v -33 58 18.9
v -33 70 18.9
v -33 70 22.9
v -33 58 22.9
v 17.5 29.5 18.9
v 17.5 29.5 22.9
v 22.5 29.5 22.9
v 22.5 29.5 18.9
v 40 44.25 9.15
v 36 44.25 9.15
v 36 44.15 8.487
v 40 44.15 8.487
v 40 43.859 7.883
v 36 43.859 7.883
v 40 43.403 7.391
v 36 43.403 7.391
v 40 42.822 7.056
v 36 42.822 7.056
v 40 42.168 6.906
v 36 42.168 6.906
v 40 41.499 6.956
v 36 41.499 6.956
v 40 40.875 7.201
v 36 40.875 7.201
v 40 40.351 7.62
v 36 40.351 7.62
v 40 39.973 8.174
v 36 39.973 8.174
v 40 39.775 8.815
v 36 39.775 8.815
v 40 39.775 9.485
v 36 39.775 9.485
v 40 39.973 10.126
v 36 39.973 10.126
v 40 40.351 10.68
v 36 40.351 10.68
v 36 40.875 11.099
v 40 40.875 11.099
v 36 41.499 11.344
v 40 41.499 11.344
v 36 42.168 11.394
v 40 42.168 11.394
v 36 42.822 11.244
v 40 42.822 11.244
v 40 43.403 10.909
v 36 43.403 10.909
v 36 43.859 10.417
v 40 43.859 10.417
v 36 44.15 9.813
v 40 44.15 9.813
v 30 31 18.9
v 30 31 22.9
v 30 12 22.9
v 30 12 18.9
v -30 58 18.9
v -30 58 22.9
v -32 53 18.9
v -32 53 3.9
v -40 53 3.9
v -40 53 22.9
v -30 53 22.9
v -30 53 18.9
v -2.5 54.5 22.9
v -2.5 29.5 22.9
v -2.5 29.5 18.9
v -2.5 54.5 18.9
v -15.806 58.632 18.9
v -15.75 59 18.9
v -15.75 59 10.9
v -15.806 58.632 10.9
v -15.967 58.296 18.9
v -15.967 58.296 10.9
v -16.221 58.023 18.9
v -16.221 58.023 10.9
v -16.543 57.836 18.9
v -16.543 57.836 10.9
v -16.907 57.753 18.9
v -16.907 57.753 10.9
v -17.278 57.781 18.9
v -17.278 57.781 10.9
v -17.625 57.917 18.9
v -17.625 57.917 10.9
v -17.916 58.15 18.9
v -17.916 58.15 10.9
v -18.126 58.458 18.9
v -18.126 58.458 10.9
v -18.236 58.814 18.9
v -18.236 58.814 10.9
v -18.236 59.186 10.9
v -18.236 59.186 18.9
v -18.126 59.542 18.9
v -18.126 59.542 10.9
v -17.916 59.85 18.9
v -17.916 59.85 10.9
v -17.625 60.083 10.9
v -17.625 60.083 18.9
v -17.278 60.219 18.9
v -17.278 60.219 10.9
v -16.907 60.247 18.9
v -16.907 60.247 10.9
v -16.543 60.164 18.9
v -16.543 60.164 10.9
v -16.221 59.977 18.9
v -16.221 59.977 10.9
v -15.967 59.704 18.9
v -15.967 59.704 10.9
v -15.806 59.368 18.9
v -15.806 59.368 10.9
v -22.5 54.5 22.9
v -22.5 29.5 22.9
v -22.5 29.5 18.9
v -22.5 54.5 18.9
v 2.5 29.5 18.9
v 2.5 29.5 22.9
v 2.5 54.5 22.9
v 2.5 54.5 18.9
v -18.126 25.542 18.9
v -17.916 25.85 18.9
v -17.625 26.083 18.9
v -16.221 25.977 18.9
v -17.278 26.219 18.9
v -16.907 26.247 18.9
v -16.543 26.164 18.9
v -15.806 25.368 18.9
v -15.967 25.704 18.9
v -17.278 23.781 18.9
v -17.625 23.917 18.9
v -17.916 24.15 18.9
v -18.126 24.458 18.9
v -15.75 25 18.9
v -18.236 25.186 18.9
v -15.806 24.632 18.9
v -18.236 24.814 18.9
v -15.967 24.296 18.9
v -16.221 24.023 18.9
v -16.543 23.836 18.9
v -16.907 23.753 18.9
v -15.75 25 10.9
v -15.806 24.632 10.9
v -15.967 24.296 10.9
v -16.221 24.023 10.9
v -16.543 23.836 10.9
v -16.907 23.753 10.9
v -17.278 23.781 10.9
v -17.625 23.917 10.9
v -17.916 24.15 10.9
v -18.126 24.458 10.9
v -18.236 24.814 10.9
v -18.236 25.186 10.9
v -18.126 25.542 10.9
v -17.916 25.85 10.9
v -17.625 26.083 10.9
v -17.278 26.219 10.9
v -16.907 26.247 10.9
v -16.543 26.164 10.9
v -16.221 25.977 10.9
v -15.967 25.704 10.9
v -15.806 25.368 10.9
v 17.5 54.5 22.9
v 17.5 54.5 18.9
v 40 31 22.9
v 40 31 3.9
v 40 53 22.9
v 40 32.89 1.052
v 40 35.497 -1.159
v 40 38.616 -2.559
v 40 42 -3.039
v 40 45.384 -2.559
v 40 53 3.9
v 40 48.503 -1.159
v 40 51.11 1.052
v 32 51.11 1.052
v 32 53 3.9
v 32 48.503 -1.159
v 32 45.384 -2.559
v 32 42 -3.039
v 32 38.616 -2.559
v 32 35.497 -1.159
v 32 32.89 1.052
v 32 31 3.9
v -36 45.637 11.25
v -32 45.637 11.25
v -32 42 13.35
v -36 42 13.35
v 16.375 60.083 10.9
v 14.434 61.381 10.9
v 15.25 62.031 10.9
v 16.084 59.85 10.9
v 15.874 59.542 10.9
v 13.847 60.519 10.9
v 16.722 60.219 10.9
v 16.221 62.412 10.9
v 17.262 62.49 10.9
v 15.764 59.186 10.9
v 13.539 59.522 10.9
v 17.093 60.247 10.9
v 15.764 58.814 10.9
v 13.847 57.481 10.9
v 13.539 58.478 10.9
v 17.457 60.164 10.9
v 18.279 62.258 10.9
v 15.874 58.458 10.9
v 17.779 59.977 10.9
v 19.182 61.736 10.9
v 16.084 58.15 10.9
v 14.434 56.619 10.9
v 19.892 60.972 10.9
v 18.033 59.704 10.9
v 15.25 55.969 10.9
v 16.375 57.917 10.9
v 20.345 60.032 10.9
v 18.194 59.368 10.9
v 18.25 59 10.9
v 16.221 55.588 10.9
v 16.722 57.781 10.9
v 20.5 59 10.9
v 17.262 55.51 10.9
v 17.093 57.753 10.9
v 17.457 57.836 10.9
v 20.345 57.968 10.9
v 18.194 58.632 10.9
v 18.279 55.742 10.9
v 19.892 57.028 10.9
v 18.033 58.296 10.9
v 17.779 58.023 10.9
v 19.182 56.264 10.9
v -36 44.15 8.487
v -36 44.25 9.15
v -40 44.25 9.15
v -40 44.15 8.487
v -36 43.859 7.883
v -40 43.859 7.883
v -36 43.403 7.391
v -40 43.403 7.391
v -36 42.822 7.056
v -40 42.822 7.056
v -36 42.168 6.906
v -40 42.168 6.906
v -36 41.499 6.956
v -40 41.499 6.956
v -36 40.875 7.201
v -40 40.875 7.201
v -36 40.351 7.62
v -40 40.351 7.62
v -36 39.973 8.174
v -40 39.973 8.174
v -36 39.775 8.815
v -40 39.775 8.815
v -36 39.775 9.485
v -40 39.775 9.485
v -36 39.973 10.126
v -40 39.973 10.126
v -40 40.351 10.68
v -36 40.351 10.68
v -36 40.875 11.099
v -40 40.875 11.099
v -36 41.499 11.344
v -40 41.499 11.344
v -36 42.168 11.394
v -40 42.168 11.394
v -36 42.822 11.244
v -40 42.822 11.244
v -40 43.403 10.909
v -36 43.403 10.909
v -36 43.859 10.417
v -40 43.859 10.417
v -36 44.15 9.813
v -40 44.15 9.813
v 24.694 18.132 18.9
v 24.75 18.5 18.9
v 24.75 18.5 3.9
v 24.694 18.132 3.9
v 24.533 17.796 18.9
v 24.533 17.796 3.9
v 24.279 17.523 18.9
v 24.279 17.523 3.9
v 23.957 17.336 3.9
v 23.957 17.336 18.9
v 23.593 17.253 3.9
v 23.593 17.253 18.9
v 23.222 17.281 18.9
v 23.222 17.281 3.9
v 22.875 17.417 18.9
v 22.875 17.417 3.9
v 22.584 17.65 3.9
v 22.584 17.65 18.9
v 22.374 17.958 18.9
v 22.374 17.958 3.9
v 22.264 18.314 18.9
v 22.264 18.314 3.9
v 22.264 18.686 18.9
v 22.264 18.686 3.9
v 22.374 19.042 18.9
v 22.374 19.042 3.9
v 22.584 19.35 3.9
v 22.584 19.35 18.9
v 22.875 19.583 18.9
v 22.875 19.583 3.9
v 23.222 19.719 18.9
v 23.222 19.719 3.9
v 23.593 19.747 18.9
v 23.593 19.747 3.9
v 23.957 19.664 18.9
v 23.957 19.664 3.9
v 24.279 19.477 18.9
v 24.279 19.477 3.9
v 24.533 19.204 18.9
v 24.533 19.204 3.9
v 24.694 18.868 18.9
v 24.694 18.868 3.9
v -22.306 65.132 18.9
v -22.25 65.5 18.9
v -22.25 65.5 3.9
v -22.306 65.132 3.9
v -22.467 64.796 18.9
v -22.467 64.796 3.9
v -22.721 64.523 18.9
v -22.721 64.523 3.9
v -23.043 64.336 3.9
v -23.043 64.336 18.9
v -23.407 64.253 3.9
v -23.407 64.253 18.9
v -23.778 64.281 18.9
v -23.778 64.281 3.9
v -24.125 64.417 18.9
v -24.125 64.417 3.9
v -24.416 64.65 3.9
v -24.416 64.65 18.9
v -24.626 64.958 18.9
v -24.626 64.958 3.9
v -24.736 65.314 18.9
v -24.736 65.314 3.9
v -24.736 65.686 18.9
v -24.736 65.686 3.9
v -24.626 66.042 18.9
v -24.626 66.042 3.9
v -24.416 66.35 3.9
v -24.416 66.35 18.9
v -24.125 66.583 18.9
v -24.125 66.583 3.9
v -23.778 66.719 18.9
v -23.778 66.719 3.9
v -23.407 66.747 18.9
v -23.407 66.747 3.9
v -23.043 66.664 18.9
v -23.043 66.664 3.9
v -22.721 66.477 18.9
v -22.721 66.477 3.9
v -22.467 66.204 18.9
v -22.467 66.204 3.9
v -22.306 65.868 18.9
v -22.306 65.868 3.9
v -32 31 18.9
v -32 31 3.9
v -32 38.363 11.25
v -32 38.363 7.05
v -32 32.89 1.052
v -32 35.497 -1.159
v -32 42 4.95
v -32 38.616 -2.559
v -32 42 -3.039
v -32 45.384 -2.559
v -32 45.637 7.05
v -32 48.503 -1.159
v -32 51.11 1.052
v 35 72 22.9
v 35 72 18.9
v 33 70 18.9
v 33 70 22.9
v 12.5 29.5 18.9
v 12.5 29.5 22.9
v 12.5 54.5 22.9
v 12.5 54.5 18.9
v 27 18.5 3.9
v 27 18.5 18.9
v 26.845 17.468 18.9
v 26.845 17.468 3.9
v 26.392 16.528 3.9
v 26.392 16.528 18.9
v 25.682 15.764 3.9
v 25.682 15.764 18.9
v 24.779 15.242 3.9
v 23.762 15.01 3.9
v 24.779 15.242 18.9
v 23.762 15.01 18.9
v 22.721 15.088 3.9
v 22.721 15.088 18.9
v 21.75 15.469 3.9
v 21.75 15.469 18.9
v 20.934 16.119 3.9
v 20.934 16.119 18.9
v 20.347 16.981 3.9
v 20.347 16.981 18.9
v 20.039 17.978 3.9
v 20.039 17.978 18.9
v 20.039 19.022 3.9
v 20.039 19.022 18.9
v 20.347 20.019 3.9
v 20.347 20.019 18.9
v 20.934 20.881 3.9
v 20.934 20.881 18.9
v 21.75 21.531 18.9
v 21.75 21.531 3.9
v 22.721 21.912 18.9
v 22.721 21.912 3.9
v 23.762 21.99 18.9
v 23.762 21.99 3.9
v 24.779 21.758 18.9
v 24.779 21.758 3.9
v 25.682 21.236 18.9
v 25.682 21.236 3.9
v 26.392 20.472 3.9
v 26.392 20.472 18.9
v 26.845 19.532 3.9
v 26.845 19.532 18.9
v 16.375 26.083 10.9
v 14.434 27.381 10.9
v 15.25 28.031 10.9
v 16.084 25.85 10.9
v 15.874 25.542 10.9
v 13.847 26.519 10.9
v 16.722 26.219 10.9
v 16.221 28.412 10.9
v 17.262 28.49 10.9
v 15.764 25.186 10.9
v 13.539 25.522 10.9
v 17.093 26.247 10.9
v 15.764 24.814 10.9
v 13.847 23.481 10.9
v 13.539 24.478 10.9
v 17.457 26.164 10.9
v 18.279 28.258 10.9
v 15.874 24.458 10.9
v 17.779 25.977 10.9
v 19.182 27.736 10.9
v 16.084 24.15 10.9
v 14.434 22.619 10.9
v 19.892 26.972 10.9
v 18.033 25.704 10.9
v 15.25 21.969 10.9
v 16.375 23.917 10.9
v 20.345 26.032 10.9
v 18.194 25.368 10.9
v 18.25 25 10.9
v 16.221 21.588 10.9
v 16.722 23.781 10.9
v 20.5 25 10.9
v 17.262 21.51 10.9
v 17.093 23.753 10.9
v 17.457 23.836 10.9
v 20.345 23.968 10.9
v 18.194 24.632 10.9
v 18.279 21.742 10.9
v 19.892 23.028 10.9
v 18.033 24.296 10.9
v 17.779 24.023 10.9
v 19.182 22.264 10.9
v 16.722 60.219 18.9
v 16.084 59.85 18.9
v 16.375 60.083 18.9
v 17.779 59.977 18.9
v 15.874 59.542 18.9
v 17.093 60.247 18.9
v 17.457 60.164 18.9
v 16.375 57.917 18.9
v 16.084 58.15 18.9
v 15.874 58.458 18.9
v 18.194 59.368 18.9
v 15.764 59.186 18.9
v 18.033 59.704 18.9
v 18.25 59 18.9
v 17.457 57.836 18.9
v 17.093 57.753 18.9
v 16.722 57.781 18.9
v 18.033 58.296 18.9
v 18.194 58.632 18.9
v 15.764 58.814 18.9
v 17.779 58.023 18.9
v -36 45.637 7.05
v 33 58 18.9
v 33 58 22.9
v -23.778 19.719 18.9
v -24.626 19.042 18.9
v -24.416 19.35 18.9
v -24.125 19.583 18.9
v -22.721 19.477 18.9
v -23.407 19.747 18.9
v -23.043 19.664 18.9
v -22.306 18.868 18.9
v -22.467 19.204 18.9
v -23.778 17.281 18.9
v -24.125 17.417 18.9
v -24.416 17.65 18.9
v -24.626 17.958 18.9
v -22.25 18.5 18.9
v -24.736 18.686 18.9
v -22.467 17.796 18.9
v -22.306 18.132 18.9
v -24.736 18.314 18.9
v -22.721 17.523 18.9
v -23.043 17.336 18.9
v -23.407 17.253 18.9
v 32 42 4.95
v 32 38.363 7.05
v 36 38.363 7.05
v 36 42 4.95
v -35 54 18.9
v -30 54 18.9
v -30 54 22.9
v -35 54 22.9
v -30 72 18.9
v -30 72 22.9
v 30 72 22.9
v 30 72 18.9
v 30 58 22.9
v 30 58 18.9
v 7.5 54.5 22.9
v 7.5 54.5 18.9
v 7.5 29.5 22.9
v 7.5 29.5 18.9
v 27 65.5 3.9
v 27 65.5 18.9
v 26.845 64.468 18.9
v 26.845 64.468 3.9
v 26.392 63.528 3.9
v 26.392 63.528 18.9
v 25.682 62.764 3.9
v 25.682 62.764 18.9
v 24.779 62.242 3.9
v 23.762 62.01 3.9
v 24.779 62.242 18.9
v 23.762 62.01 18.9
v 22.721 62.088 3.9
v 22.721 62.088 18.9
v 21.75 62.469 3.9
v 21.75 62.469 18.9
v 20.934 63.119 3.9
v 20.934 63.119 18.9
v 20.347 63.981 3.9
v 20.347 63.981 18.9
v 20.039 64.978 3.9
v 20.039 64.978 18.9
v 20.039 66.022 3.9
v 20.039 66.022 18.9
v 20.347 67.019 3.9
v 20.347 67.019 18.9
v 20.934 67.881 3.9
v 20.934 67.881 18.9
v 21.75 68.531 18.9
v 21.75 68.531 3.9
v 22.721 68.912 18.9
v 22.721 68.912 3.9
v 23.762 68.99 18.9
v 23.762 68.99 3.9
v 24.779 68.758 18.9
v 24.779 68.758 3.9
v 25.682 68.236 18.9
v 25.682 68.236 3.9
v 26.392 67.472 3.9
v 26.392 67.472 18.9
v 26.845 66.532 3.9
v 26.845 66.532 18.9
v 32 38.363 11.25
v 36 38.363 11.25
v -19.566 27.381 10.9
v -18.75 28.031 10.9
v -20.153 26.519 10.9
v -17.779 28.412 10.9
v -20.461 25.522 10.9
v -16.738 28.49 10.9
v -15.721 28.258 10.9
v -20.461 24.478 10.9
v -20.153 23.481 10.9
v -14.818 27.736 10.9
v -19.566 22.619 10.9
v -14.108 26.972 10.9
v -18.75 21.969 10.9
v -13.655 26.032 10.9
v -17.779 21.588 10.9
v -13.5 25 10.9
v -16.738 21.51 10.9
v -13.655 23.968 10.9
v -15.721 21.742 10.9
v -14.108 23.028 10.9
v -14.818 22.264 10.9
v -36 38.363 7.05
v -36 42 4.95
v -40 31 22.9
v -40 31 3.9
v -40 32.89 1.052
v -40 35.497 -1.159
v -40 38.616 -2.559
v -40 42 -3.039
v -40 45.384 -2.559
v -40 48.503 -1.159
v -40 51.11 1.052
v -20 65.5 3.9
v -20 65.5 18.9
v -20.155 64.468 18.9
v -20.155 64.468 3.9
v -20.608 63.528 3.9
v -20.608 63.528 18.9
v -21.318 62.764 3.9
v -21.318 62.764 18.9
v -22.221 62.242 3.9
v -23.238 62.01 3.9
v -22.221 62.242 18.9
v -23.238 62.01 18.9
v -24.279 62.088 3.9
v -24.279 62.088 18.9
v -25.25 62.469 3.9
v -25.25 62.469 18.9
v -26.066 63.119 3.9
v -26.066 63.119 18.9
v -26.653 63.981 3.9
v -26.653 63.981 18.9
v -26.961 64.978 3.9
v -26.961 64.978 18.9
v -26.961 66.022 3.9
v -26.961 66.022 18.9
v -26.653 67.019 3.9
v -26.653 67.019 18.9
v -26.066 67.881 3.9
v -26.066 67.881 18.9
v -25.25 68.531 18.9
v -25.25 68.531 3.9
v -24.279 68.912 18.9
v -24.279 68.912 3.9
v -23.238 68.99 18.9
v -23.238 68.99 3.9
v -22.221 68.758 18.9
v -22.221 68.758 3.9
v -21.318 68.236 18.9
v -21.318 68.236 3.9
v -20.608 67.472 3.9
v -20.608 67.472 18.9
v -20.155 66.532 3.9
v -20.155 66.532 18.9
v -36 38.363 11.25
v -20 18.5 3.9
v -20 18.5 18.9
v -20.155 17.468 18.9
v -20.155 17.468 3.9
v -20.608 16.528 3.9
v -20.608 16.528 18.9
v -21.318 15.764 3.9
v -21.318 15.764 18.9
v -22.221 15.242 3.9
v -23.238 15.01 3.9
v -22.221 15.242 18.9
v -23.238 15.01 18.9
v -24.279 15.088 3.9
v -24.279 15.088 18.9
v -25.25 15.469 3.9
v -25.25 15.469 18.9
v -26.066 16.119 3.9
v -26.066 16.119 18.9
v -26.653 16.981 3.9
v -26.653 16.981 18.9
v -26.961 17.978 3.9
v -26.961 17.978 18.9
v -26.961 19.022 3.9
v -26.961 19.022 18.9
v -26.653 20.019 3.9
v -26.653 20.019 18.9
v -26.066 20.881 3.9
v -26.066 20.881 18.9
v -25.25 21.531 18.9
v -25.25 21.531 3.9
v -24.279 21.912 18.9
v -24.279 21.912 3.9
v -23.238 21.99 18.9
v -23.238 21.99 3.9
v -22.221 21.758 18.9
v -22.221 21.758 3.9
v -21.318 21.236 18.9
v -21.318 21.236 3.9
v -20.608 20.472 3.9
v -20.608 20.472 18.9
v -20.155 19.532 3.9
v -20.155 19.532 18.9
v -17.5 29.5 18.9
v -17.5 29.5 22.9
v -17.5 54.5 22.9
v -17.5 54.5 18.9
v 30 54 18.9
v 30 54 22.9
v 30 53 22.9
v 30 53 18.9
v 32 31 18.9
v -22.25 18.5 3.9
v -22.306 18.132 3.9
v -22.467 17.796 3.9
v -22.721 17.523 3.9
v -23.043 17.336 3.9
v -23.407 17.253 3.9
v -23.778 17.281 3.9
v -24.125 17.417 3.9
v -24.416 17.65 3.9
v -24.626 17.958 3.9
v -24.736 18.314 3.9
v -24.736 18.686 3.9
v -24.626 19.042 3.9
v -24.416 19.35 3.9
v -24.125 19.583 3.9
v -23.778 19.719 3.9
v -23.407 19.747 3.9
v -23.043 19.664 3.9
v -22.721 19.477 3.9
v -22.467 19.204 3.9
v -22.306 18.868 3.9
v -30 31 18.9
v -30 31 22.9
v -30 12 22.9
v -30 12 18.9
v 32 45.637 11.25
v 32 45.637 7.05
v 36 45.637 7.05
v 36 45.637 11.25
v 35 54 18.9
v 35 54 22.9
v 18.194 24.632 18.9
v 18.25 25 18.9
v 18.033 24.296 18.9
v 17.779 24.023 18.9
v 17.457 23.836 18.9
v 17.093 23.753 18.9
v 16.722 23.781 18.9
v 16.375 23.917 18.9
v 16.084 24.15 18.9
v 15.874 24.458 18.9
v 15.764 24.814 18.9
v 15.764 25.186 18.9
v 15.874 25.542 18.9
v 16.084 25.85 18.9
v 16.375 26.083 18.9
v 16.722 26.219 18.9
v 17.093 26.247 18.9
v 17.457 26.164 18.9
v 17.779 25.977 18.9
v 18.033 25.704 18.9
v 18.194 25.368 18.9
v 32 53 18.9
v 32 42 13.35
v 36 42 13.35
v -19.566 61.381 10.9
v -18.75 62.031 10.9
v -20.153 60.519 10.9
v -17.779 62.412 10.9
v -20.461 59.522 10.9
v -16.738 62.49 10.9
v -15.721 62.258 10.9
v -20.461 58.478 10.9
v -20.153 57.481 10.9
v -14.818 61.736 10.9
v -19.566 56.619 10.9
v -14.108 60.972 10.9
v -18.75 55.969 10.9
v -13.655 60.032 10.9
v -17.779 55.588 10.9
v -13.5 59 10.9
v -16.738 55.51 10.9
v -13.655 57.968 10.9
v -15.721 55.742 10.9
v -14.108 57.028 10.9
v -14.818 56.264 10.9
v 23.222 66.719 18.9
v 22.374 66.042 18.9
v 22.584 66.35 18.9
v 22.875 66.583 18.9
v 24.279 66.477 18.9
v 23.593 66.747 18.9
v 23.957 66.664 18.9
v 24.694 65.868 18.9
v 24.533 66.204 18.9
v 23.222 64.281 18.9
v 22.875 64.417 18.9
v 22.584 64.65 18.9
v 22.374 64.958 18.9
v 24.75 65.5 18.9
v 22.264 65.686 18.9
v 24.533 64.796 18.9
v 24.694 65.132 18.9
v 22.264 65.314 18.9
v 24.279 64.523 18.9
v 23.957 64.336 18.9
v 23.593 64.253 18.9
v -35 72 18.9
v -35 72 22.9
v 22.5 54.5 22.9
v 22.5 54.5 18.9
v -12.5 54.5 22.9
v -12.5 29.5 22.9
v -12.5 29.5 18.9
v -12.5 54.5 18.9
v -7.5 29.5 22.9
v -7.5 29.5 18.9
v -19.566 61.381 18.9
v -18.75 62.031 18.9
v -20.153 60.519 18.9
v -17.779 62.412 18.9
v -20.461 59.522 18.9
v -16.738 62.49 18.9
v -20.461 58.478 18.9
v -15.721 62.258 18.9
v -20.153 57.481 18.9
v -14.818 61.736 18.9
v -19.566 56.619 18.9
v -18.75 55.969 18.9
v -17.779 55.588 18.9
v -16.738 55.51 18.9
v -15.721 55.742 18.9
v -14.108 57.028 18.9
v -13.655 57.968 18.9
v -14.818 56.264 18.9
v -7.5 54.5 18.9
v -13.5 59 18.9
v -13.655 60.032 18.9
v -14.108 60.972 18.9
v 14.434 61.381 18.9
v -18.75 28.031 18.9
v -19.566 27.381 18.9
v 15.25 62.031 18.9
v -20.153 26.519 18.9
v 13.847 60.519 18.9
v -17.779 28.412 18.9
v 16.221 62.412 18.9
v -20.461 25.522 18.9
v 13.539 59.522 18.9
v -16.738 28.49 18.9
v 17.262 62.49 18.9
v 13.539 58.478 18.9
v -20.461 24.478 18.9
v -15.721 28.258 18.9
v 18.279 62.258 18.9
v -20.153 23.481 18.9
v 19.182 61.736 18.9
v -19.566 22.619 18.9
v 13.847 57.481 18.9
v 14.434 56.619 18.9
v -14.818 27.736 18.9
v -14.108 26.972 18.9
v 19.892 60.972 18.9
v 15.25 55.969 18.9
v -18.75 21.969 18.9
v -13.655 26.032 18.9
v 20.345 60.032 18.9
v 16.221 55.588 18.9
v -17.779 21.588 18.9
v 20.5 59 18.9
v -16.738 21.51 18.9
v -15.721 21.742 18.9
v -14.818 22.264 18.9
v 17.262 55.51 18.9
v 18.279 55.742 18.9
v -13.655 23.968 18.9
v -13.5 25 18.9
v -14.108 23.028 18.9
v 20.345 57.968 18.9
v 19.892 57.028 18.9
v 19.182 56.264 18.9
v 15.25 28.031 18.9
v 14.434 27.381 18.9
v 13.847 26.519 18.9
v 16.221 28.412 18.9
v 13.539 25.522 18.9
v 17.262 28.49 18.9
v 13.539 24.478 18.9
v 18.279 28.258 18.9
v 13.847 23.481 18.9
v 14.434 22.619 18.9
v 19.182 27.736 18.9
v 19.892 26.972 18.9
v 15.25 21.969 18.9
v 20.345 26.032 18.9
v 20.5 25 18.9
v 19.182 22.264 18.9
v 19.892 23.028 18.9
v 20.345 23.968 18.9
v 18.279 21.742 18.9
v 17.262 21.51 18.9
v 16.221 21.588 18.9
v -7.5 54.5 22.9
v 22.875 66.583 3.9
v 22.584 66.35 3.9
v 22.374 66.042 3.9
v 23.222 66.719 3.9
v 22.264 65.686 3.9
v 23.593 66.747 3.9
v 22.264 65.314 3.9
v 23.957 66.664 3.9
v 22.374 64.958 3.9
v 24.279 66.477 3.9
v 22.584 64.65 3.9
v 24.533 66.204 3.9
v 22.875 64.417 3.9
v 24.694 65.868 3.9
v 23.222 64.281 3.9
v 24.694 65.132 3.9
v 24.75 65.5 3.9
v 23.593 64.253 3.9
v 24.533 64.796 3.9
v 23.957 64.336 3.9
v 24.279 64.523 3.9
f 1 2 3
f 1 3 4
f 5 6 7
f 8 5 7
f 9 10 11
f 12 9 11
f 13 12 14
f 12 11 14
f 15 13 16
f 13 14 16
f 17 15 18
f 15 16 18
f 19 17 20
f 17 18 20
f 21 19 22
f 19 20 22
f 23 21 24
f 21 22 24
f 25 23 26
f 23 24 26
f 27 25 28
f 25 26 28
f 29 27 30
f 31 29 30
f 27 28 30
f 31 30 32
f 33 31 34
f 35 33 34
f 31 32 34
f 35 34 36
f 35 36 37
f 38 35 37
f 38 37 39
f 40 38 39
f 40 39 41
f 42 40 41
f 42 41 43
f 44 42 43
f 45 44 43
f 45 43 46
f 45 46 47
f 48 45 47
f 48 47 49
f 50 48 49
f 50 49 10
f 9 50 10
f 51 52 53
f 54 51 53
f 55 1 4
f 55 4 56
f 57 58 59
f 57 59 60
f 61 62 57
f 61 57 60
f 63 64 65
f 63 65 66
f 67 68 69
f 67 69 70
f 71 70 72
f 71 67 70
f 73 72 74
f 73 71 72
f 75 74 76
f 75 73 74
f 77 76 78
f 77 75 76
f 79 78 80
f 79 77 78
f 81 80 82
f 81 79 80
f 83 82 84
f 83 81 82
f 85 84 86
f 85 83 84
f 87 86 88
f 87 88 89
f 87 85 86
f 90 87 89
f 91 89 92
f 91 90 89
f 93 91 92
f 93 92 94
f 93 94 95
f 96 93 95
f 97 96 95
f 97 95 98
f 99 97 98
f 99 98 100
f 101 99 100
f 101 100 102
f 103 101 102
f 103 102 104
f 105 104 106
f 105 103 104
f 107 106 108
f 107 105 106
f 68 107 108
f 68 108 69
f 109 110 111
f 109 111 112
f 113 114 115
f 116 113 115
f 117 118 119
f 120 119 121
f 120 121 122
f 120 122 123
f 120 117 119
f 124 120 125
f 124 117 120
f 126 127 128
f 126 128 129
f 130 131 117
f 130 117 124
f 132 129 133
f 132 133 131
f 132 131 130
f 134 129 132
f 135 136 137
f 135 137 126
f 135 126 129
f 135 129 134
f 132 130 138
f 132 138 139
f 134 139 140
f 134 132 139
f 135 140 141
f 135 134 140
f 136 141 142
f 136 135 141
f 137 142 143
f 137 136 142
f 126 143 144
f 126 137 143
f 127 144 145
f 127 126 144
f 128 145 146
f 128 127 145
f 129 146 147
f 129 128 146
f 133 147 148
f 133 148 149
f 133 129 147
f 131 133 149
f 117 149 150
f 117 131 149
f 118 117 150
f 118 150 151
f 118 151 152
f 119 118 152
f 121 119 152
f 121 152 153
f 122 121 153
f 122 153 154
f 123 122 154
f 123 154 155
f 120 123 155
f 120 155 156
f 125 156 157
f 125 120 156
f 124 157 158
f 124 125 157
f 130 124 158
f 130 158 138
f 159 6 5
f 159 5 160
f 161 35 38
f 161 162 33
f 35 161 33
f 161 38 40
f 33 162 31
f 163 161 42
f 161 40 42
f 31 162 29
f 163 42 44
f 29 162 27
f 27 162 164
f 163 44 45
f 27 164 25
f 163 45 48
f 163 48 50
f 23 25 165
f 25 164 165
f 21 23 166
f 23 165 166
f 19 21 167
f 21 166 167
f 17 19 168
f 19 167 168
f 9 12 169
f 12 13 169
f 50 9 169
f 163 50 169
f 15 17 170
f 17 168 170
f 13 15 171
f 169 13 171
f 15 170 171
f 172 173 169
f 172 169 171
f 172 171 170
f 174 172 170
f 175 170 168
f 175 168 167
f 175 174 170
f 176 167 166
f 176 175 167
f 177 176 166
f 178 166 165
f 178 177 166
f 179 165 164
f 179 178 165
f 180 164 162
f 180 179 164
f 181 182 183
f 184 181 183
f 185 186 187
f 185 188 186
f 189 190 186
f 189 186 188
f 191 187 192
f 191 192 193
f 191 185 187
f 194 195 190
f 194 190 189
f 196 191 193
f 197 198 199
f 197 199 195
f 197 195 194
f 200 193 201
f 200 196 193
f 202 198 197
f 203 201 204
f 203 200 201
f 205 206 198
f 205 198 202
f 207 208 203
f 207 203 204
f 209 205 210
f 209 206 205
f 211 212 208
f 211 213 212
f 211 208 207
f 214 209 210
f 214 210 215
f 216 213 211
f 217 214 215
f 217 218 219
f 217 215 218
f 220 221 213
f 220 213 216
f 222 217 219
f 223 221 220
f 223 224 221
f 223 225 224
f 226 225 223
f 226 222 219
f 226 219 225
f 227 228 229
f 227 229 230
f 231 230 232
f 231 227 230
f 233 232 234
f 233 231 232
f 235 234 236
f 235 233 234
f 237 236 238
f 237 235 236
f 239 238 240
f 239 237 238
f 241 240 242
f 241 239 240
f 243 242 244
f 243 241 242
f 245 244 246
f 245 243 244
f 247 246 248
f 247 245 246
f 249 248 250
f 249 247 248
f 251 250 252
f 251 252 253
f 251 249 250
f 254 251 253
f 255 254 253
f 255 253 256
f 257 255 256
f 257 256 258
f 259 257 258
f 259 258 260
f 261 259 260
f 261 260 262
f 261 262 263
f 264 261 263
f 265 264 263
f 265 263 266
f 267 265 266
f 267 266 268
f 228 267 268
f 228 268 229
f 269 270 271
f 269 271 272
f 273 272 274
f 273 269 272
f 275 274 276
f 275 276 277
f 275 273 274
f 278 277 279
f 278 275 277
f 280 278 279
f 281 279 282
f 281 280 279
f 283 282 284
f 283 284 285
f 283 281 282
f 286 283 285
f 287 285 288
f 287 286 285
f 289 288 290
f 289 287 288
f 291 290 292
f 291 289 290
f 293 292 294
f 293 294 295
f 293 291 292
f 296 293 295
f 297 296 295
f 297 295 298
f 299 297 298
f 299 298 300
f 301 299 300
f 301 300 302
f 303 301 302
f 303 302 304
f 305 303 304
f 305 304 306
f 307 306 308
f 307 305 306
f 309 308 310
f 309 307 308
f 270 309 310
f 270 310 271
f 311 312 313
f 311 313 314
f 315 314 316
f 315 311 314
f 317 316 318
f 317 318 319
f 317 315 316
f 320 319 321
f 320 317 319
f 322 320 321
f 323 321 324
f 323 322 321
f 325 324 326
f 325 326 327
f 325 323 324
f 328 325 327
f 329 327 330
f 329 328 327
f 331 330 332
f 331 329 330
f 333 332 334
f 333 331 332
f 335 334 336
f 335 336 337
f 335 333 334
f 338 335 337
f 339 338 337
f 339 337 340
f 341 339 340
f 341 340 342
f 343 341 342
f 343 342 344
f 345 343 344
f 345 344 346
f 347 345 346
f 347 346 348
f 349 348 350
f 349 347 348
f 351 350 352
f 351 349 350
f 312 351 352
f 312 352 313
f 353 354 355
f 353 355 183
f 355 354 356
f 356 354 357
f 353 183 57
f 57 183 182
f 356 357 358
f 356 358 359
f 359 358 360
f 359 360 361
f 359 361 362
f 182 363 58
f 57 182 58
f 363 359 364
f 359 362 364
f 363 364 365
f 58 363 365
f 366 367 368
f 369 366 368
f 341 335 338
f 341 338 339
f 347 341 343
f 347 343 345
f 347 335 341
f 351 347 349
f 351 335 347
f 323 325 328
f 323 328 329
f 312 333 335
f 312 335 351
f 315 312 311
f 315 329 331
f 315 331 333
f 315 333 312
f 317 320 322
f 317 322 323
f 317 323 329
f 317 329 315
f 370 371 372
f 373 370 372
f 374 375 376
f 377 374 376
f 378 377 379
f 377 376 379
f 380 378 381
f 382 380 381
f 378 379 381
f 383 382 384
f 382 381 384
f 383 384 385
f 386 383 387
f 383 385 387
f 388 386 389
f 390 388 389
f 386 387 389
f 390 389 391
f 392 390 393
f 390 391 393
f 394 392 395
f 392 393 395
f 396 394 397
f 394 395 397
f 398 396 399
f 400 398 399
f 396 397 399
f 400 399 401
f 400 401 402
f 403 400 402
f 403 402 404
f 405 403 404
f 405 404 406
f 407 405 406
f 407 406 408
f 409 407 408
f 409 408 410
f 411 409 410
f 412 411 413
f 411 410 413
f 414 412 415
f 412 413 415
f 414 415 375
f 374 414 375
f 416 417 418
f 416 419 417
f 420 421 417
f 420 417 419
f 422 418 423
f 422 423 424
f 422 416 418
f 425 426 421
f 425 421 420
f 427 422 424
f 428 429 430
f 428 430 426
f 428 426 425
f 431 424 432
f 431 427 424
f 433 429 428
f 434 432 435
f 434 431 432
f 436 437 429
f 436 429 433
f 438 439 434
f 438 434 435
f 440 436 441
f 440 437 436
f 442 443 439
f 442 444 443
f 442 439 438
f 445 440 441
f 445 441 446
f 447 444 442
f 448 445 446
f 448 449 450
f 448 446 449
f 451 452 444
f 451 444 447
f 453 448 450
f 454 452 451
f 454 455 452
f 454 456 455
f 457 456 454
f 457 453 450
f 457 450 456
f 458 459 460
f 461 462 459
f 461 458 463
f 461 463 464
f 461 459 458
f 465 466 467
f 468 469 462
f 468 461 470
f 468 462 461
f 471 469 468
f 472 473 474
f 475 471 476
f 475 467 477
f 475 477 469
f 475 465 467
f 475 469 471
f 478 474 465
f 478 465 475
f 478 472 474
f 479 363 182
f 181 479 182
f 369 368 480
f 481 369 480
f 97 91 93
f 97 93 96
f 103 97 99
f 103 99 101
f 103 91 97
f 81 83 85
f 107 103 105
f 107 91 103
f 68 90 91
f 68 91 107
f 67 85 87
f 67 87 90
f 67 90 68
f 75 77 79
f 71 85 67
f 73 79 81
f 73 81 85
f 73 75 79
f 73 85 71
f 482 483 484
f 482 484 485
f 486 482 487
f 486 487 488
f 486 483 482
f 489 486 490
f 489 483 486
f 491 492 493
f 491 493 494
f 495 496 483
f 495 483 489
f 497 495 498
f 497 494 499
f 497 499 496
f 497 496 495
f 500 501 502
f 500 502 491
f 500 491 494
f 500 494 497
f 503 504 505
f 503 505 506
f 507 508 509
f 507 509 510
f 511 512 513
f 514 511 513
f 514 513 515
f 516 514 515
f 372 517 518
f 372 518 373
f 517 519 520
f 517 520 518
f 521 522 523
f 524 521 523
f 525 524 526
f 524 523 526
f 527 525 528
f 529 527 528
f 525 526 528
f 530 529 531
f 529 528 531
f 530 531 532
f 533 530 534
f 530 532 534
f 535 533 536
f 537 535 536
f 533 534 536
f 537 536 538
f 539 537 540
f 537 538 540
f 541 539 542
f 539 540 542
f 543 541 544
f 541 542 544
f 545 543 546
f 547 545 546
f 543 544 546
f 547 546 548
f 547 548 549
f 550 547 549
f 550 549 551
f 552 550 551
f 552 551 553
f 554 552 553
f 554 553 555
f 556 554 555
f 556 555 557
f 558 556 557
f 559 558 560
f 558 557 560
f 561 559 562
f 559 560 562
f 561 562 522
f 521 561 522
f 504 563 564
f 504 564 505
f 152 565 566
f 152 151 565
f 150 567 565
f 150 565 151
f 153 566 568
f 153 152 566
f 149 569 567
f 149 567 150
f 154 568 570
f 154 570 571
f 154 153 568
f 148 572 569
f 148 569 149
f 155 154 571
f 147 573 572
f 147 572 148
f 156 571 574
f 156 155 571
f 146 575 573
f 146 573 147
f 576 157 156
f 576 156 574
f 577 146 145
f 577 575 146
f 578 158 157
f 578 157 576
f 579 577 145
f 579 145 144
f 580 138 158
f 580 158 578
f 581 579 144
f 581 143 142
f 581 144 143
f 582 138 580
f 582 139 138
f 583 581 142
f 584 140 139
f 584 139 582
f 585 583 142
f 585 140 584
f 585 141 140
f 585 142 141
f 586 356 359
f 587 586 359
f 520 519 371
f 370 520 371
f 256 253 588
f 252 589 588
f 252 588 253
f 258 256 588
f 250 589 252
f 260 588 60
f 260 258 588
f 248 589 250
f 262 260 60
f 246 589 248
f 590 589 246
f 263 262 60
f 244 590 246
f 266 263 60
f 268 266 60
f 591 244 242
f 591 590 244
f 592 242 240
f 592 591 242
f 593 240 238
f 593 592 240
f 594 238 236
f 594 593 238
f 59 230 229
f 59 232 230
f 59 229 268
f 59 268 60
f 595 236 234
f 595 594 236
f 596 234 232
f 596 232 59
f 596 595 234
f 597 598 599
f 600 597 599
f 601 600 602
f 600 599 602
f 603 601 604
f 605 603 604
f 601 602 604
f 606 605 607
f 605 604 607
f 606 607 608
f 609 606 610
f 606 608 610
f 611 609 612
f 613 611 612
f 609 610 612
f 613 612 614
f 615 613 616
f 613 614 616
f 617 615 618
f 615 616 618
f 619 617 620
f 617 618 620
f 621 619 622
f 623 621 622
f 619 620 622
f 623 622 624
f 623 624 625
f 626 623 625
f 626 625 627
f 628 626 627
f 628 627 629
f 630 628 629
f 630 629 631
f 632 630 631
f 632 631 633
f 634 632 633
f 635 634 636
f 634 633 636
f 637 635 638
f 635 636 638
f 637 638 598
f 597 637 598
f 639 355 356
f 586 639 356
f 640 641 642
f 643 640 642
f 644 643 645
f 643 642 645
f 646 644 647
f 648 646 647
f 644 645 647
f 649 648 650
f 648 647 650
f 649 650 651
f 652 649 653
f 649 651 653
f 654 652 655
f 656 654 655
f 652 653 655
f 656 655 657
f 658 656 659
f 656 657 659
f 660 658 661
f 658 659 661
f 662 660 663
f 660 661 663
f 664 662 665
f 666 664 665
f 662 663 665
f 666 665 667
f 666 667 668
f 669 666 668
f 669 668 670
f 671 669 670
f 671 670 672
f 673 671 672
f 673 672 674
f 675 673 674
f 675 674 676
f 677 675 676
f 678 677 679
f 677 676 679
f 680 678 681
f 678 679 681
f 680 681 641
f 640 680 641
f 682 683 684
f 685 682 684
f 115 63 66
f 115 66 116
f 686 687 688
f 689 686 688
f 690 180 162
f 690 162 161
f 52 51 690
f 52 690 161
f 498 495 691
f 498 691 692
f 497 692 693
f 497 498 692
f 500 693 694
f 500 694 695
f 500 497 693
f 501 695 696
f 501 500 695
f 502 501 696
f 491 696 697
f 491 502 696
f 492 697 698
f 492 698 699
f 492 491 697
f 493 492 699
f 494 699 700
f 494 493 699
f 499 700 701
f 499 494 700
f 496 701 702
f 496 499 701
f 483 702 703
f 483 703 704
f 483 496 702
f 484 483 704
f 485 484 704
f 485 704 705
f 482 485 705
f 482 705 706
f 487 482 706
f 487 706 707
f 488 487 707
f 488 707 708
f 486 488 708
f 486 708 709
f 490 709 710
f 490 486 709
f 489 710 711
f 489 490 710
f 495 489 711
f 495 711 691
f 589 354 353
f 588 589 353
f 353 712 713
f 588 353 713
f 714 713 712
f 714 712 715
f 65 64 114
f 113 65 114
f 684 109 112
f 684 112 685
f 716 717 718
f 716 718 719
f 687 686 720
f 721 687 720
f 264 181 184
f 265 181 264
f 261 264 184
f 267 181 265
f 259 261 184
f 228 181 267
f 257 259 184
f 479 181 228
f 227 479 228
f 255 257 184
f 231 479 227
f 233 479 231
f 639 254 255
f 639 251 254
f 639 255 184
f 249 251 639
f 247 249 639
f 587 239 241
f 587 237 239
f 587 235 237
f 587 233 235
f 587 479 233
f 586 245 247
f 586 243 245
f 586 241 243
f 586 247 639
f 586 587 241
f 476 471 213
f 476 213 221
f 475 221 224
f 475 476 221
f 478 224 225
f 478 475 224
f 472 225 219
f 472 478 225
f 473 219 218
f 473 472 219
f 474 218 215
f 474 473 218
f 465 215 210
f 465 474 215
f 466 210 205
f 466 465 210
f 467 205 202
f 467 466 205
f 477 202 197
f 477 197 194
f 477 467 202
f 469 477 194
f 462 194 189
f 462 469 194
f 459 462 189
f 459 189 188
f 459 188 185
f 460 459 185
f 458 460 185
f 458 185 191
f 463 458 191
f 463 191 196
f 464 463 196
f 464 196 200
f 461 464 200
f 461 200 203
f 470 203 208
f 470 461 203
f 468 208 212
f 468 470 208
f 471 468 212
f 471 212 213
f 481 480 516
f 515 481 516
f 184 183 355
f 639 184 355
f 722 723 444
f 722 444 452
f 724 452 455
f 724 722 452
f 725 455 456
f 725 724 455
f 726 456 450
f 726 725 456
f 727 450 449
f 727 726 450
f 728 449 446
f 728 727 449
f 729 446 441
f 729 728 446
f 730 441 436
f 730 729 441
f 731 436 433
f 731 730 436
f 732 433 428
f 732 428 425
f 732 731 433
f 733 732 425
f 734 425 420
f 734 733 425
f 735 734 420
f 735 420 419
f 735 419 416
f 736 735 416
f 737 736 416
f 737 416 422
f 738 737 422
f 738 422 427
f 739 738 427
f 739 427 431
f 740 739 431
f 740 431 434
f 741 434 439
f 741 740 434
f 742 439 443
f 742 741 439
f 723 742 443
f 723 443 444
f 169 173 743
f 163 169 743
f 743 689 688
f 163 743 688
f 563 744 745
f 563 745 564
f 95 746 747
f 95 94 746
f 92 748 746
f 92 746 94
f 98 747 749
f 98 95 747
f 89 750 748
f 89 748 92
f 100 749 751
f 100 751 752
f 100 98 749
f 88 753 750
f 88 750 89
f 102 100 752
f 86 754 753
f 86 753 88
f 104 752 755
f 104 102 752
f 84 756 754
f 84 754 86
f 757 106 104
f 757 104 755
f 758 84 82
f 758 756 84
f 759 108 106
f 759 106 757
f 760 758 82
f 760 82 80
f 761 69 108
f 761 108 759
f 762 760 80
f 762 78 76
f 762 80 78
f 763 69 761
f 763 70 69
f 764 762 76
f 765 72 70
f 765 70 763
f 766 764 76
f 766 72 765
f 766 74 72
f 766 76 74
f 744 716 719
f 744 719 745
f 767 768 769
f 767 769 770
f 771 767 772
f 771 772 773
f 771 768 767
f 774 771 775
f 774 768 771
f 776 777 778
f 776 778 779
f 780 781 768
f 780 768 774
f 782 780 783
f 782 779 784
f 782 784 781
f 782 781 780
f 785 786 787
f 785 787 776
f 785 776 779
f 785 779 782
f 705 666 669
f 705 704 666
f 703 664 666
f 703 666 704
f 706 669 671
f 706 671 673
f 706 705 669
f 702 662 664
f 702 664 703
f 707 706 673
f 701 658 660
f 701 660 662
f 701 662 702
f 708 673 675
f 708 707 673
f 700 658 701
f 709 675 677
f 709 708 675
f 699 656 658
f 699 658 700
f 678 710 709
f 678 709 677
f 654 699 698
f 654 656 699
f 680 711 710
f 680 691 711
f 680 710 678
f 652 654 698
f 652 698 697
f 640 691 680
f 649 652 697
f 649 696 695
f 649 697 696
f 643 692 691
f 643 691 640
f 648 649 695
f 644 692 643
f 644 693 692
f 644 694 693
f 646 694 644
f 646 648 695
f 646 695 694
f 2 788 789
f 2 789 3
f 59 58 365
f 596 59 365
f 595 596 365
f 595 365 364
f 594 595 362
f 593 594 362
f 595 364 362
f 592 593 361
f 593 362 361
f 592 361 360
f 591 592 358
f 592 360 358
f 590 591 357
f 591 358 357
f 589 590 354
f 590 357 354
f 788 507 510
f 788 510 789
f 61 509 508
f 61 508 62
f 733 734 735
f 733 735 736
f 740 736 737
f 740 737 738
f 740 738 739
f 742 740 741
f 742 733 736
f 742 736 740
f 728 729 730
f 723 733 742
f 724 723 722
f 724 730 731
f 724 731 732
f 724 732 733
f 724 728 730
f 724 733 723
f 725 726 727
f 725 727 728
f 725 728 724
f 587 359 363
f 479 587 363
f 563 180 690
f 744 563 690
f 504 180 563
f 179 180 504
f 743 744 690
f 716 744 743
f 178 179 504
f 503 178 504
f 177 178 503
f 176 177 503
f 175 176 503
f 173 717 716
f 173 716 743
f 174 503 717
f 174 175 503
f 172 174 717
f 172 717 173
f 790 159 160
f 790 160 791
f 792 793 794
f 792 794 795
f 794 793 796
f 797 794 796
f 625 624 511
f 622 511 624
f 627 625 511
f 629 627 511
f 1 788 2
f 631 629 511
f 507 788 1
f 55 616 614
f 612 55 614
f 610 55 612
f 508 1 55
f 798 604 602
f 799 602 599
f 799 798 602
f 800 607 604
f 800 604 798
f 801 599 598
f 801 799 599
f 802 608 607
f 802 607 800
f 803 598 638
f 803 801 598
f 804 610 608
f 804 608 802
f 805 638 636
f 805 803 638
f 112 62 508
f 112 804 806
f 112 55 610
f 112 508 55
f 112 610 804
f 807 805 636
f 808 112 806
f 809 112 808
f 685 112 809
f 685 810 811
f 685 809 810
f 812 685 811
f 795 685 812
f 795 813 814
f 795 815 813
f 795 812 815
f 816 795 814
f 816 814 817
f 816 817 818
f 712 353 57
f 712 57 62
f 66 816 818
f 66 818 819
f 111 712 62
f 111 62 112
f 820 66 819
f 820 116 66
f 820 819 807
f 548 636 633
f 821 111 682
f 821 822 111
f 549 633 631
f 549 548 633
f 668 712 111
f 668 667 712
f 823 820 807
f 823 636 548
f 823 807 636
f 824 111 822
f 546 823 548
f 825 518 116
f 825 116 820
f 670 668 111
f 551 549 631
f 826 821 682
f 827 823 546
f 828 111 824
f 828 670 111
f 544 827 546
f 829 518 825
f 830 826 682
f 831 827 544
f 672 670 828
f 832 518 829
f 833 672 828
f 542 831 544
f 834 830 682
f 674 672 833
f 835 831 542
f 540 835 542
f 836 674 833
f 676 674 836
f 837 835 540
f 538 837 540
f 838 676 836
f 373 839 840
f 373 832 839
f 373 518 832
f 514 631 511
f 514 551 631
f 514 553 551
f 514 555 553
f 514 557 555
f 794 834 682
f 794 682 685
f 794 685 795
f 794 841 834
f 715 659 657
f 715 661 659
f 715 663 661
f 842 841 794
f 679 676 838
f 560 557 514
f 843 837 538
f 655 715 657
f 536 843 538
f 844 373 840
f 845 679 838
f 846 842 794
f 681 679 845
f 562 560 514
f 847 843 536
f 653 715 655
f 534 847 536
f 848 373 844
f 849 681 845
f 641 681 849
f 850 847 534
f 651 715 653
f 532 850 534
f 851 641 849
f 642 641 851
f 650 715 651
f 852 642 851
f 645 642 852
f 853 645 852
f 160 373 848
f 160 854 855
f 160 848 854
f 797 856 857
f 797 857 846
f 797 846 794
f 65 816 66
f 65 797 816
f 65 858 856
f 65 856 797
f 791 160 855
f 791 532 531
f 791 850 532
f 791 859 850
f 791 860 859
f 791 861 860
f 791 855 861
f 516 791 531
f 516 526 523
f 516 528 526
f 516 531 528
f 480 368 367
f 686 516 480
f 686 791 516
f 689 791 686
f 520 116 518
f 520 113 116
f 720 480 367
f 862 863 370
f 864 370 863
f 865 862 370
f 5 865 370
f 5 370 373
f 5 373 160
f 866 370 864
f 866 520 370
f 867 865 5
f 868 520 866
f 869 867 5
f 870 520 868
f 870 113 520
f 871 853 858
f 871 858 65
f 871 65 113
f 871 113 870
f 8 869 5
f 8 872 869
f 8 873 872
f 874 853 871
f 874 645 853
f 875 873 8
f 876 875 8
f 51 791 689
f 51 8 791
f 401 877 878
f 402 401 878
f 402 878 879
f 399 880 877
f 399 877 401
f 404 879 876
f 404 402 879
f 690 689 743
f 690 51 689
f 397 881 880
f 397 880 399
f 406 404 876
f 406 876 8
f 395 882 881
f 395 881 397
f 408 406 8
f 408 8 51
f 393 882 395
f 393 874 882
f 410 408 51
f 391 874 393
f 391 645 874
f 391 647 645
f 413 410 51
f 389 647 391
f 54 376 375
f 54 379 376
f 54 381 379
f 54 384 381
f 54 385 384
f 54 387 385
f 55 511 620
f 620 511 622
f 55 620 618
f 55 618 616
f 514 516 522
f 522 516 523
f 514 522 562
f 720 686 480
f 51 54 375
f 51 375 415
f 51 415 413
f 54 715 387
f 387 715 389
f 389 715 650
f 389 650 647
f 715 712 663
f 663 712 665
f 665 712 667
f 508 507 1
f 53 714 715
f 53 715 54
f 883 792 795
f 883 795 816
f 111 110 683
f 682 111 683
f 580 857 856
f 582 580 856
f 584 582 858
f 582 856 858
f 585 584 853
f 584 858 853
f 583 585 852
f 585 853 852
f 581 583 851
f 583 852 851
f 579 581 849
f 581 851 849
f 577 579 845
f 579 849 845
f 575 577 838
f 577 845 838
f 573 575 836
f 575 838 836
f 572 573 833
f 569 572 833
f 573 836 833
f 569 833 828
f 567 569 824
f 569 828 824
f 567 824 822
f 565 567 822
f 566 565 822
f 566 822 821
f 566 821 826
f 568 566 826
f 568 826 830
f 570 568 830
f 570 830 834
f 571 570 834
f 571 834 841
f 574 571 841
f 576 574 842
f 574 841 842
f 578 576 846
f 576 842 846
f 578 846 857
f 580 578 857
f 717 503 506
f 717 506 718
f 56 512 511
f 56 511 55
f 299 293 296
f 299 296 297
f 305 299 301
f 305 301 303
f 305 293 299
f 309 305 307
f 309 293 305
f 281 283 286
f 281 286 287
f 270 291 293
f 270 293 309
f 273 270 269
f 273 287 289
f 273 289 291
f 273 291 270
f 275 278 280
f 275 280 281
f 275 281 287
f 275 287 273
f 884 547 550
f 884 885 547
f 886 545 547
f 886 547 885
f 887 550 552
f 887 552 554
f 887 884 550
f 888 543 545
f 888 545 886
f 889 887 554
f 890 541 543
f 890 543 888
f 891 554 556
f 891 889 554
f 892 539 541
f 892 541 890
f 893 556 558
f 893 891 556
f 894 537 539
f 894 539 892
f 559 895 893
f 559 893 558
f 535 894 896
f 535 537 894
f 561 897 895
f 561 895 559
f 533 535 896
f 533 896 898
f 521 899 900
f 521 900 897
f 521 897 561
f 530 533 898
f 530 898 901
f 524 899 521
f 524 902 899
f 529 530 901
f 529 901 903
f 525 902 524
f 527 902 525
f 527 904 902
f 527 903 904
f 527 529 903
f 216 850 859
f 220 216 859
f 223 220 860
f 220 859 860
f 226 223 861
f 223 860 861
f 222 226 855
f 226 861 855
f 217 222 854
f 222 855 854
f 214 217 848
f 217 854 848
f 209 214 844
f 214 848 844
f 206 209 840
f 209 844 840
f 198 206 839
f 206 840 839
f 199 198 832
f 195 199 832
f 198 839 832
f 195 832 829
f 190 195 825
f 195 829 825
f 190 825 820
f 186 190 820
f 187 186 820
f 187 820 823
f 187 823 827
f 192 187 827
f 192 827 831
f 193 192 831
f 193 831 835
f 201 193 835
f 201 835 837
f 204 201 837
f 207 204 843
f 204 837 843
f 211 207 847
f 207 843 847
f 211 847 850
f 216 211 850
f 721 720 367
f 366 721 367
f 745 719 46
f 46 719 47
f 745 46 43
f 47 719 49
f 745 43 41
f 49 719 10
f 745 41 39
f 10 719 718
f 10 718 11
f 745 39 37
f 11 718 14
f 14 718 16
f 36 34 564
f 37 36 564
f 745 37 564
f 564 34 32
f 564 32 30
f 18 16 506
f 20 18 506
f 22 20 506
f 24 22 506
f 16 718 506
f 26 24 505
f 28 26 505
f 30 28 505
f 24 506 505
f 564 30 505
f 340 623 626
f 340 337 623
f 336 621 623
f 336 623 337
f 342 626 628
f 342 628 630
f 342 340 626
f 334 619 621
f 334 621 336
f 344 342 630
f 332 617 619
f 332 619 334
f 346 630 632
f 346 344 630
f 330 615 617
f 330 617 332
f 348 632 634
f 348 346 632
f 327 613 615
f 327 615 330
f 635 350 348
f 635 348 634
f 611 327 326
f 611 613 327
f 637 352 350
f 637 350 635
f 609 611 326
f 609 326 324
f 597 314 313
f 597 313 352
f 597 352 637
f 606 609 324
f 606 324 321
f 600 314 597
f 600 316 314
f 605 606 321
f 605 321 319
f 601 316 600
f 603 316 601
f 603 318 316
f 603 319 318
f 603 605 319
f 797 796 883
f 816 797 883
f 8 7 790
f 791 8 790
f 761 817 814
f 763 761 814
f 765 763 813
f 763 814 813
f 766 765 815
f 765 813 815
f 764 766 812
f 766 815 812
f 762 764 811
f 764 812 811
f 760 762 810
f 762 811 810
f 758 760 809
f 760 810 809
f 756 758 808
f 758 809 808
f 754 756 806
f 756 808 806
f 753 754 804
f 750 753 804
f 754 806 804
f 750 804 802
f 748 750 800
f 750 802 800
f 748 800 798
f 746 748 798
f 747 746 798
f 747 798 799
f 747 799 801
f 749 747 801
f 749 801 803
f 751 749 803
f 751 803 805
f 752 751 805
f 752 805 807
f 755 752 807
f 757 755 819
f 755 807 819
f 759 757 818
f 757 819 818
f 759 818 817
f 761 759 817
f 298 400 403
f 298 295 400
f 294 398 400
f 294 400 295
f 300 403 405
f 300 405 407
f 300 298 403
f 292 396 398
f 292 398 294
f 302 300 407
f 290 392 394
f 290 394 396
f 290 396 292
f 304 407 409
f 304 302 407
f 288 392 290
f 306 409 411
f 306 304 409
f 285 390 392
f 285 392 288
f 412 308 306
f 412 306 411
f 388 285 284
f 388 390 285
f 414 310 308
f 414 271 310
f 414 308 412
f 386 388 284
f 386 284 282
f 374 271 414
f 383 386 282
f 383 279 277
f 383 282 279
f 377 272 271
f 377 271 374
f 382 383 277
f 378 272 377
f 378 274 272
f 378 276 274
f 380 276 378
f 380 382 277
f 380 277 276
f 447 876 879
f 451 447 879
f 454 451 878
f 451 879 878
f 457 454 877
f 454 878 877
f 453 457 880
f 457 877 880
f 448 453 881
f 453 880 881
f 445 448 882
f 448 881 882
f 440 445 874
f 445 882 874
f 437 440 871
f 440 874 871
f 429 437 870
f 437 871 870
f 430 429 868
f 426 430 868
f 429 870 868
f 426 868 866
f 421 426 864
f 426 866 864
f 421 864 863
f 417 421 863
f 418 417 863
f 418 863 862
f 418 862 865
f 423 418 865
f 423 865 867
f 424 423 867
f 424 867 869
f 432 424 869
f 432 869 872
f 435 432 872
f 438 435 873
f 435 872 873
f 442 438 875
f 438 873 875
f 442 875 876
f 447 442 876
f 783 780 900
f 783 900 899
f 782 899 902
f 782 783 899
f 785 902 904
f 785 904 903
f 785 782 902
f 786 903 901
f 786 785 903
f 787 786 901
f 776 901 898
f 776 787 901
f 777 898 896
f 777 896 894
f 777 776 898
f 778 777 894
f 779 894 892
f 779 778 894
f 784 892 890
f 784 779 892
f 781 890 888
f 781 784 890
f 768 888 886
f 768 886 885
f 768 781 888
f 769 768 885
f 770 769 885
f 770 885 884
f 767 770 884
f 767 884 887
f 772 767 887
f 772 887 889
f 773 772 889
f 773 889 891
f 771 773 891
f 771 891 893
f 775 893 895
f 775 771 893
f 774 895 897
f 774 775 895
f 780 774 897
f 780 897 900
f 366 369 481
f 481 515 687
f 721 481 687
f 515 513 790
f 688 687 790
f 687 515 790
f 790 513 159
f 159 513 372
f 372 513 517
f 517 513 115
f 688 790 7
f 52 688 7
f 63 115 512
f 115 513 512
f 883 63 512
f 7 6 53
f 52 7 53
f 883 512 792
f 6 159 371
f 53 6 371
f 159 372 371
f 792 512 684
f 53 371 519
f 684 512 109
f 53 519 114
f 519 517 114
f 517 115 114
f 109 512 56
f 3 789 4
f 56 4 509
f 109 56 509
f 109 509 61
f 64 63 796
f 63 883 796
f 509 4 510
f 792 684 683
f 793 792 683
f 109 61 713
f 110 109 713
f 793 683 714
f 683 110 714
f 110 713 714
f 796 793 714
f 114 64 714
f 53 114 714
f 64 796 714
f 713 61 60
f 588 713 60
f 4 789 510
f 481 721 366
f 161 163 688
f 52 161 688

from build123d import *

# Parameters (mm, degrees)
SKETCH_W             = 60
SKETCH_H             = 60
PAD_DEPTH            = 4
SKETCH001_R          = 3.5
SKETCH001_R_2        = 1.25
PAD001_DEPTH         = 8
SKETCH009_W          = 5
SKETCH009_H          = 25
POCKET008_DEPTH      = 4
PAD006_DEPTH         = 4
SKETCH015_W          = 22
SKETCH015_H          = 4
PAD007_DEPTH         = 2
SKETCH003_R          = 2.25
PAD008_DEPTH         = 8
SKETCH014_R          = 3.5
SKETCH014_R_2        = 1.25
PAD009_DEPTH         = 15
POCKET_DEPTH         = 4
BODY_PLACEMENT_ANGLE = 180


with BuildPart() as part:
    # Sketch → Pad (new body)
    with BuildSketch(Plane.XY):
        Rectangle(SKETCH_W, SKETCH_H)
    extrude(amount=PAD_DEPTH)

    # Sketch001 (on Face6 of Pad) → Pad001 (join)
    with BuildSketch(Plane.XY.offset(4)):
        with Locations((-17, 17)):
            Circle(SKETCH001_R)
        with Locations((-17, 17)):
            Circle(SKETCH001_R_2, mode=Mode.SUBTRACT)
        with Locations((-17, -17)):
            Circle(SKETCH001_R)
        with Locations((-17, -17)):
            Circle(SKETCH001_R_2, mode=Mode.SUBTRACT)
        with Locations((17, -17)):
            Circle(SKETCH001_R)
        with Locations((17, -17)):
            Circle(SKETCH001_R_2, mode=Mode.SUBTRACT)
        with Locations((17, 17)):
            Circle(SKETCH001_R)
        with Locations((17, 17)):
            Circle(SKETCH001_R_2, mode=Mode.SUBTRACT)
    extrude(amount=PAD001_DEPTH)

    # Sketch009 → Pocket008 (cut)
    with BuildSketch(Plane(origin=(0, 0, 0), x_dir=(1, 0, 0), z_dir=(0, 0, -1))):
        Rectangle(SKETCH009_W, SKETCH009_H)
        with Locations((10, 0)):
            Rectangle(SKETCH009_W, SKETCH009_H)
        with Locations((20, 0)):
            Rectangle(SKETCH009_W, SKETCH009_H)
        with Locations((-10, 0)):
            Rectangle(SKETCH009_W, SKETCH009_H)
        with Locations((-20, 0)):
            Rectangle(SKETCH009_W, SKETCH009_H)
    extrude(amount=-POCKET008_DEPTH, mode=Mode.SUBTRACT)

    # Sketch012 (on Face5 of Pocket008) → Pad006 (join)
    with BuildSketch(Plane.XY.offset(4)):
        Polygon((-30, -12), (-35, -12), (-35, -30), (-33, -28), (-33, -16), (-30, -16), align=None)
    pad006 = extrude(amount=-PAD006_DEPTH)

    # Mirrored005: Pad006 across Sketch012 V_Axis
    add(pad006.mirror(Plane(origin=(0, 0, 4), x_dir=(0, 0, 1), z_dir=(1, 0, 0))))

    # Sketch015 (on Face4 of Pad) → Pad007 (join)
    with BuildSketch(Plane(origin=(-30, 0, 0), x_dir=(0, -1, 0), z_dir=(-1, 0, 0))):
        with Locations((0, 2)):
            Rectangle(SKETCH015_W, SKETCH015_H)
    pad007 = extrude(amount=PAD007_DEPTH)

    # Sketch003 (on Face42 of Pad007) → Pad008 (join)
    with BuildSketch(Plane(origin=(-32, 0, 0), x_dir=(0, -1, 0), z_dir=(-1, 0, 0))):
        with BuildLine():
            ThreePointArc((11, 19), (0, 25.938622), (-11, 19))
            Line((-11, 19), (-11, 0))
            Line((11, 0), (-11, 0))
            Line((11, 19), (11, 0))
        make_face()
        with Locations((0, 13.75)):
            Circle(SKETCH003_R, mode=Mode.SUBTRACT)
    pad008 = extrude(amount=PAD008_DEPTH)

    # Sketch014 → Pad009 (join)
    with BuildSketch(Plane.XY.offset(4)):
        with Locations((-23.5, 23.5)):
            Circle(SKETCH014_R)
        with Locations((-23.5, 23.5)):
            Circle(SKETCH014_R_2, mode=Mode.SUBTRACT)
        with Locations((23.5, 23.5)):
            Circle(SKETCH014_R)
        with Locations((23.5, 23.5)):
            Circle(SKETCH014_R_2, mode=Mode.SUBTRACT)
        with Locations((23.5, -23.5)):
            Circle(SKETCH014_R)
        with Locations((23.5, -23.5)):
            Circle(SKETCH014_R_2, mode=Mode.SUBTRACT)
        with Locations((-23.5, -23.5)):
            Circle(SKETCH014_R)
        with Locations((-23.5, -23.5)):
            Circle(SKETCH014_R_2, mode=Mode.SUBTRACT)
    extrude(amount=PAD009_DEPTH)

    # Sketch016 (on Face58 of Pad009) → Pocket (cut)
    with BuildSketch(Plane.YZ.offset(-32)):
        Polygon((-3.637307, 15.85), (-3.637307, 11.65), (0, 9.55), (3.637307, 11.65), (3.637307, 15.85), (0, 17.95), align=None)
    pocket = extrude(amount=-POCKET_DEPTH, mode=Mode.SUBTRACT)

    # Mirrored: Pad007, Pad008 across YZ
    add(pad007.mirror(Plane.YZ))
    add(pad008.mirror(Plane.YZ))

    # Mirrored006: Pocket across YZ
    add(pocket.mirror(Plane.YZ), mode=Mode.SUBTRACT)


with BuildPart() as part_1:
    # Body placement: moved
    add(part.part.moved(Location((0, 42, 22.9))).rotate(Axis((0, 42, 22.9), (1, 0, 0)), BODY_PLACEMENT_ANGLE))


solid = part_1.part
